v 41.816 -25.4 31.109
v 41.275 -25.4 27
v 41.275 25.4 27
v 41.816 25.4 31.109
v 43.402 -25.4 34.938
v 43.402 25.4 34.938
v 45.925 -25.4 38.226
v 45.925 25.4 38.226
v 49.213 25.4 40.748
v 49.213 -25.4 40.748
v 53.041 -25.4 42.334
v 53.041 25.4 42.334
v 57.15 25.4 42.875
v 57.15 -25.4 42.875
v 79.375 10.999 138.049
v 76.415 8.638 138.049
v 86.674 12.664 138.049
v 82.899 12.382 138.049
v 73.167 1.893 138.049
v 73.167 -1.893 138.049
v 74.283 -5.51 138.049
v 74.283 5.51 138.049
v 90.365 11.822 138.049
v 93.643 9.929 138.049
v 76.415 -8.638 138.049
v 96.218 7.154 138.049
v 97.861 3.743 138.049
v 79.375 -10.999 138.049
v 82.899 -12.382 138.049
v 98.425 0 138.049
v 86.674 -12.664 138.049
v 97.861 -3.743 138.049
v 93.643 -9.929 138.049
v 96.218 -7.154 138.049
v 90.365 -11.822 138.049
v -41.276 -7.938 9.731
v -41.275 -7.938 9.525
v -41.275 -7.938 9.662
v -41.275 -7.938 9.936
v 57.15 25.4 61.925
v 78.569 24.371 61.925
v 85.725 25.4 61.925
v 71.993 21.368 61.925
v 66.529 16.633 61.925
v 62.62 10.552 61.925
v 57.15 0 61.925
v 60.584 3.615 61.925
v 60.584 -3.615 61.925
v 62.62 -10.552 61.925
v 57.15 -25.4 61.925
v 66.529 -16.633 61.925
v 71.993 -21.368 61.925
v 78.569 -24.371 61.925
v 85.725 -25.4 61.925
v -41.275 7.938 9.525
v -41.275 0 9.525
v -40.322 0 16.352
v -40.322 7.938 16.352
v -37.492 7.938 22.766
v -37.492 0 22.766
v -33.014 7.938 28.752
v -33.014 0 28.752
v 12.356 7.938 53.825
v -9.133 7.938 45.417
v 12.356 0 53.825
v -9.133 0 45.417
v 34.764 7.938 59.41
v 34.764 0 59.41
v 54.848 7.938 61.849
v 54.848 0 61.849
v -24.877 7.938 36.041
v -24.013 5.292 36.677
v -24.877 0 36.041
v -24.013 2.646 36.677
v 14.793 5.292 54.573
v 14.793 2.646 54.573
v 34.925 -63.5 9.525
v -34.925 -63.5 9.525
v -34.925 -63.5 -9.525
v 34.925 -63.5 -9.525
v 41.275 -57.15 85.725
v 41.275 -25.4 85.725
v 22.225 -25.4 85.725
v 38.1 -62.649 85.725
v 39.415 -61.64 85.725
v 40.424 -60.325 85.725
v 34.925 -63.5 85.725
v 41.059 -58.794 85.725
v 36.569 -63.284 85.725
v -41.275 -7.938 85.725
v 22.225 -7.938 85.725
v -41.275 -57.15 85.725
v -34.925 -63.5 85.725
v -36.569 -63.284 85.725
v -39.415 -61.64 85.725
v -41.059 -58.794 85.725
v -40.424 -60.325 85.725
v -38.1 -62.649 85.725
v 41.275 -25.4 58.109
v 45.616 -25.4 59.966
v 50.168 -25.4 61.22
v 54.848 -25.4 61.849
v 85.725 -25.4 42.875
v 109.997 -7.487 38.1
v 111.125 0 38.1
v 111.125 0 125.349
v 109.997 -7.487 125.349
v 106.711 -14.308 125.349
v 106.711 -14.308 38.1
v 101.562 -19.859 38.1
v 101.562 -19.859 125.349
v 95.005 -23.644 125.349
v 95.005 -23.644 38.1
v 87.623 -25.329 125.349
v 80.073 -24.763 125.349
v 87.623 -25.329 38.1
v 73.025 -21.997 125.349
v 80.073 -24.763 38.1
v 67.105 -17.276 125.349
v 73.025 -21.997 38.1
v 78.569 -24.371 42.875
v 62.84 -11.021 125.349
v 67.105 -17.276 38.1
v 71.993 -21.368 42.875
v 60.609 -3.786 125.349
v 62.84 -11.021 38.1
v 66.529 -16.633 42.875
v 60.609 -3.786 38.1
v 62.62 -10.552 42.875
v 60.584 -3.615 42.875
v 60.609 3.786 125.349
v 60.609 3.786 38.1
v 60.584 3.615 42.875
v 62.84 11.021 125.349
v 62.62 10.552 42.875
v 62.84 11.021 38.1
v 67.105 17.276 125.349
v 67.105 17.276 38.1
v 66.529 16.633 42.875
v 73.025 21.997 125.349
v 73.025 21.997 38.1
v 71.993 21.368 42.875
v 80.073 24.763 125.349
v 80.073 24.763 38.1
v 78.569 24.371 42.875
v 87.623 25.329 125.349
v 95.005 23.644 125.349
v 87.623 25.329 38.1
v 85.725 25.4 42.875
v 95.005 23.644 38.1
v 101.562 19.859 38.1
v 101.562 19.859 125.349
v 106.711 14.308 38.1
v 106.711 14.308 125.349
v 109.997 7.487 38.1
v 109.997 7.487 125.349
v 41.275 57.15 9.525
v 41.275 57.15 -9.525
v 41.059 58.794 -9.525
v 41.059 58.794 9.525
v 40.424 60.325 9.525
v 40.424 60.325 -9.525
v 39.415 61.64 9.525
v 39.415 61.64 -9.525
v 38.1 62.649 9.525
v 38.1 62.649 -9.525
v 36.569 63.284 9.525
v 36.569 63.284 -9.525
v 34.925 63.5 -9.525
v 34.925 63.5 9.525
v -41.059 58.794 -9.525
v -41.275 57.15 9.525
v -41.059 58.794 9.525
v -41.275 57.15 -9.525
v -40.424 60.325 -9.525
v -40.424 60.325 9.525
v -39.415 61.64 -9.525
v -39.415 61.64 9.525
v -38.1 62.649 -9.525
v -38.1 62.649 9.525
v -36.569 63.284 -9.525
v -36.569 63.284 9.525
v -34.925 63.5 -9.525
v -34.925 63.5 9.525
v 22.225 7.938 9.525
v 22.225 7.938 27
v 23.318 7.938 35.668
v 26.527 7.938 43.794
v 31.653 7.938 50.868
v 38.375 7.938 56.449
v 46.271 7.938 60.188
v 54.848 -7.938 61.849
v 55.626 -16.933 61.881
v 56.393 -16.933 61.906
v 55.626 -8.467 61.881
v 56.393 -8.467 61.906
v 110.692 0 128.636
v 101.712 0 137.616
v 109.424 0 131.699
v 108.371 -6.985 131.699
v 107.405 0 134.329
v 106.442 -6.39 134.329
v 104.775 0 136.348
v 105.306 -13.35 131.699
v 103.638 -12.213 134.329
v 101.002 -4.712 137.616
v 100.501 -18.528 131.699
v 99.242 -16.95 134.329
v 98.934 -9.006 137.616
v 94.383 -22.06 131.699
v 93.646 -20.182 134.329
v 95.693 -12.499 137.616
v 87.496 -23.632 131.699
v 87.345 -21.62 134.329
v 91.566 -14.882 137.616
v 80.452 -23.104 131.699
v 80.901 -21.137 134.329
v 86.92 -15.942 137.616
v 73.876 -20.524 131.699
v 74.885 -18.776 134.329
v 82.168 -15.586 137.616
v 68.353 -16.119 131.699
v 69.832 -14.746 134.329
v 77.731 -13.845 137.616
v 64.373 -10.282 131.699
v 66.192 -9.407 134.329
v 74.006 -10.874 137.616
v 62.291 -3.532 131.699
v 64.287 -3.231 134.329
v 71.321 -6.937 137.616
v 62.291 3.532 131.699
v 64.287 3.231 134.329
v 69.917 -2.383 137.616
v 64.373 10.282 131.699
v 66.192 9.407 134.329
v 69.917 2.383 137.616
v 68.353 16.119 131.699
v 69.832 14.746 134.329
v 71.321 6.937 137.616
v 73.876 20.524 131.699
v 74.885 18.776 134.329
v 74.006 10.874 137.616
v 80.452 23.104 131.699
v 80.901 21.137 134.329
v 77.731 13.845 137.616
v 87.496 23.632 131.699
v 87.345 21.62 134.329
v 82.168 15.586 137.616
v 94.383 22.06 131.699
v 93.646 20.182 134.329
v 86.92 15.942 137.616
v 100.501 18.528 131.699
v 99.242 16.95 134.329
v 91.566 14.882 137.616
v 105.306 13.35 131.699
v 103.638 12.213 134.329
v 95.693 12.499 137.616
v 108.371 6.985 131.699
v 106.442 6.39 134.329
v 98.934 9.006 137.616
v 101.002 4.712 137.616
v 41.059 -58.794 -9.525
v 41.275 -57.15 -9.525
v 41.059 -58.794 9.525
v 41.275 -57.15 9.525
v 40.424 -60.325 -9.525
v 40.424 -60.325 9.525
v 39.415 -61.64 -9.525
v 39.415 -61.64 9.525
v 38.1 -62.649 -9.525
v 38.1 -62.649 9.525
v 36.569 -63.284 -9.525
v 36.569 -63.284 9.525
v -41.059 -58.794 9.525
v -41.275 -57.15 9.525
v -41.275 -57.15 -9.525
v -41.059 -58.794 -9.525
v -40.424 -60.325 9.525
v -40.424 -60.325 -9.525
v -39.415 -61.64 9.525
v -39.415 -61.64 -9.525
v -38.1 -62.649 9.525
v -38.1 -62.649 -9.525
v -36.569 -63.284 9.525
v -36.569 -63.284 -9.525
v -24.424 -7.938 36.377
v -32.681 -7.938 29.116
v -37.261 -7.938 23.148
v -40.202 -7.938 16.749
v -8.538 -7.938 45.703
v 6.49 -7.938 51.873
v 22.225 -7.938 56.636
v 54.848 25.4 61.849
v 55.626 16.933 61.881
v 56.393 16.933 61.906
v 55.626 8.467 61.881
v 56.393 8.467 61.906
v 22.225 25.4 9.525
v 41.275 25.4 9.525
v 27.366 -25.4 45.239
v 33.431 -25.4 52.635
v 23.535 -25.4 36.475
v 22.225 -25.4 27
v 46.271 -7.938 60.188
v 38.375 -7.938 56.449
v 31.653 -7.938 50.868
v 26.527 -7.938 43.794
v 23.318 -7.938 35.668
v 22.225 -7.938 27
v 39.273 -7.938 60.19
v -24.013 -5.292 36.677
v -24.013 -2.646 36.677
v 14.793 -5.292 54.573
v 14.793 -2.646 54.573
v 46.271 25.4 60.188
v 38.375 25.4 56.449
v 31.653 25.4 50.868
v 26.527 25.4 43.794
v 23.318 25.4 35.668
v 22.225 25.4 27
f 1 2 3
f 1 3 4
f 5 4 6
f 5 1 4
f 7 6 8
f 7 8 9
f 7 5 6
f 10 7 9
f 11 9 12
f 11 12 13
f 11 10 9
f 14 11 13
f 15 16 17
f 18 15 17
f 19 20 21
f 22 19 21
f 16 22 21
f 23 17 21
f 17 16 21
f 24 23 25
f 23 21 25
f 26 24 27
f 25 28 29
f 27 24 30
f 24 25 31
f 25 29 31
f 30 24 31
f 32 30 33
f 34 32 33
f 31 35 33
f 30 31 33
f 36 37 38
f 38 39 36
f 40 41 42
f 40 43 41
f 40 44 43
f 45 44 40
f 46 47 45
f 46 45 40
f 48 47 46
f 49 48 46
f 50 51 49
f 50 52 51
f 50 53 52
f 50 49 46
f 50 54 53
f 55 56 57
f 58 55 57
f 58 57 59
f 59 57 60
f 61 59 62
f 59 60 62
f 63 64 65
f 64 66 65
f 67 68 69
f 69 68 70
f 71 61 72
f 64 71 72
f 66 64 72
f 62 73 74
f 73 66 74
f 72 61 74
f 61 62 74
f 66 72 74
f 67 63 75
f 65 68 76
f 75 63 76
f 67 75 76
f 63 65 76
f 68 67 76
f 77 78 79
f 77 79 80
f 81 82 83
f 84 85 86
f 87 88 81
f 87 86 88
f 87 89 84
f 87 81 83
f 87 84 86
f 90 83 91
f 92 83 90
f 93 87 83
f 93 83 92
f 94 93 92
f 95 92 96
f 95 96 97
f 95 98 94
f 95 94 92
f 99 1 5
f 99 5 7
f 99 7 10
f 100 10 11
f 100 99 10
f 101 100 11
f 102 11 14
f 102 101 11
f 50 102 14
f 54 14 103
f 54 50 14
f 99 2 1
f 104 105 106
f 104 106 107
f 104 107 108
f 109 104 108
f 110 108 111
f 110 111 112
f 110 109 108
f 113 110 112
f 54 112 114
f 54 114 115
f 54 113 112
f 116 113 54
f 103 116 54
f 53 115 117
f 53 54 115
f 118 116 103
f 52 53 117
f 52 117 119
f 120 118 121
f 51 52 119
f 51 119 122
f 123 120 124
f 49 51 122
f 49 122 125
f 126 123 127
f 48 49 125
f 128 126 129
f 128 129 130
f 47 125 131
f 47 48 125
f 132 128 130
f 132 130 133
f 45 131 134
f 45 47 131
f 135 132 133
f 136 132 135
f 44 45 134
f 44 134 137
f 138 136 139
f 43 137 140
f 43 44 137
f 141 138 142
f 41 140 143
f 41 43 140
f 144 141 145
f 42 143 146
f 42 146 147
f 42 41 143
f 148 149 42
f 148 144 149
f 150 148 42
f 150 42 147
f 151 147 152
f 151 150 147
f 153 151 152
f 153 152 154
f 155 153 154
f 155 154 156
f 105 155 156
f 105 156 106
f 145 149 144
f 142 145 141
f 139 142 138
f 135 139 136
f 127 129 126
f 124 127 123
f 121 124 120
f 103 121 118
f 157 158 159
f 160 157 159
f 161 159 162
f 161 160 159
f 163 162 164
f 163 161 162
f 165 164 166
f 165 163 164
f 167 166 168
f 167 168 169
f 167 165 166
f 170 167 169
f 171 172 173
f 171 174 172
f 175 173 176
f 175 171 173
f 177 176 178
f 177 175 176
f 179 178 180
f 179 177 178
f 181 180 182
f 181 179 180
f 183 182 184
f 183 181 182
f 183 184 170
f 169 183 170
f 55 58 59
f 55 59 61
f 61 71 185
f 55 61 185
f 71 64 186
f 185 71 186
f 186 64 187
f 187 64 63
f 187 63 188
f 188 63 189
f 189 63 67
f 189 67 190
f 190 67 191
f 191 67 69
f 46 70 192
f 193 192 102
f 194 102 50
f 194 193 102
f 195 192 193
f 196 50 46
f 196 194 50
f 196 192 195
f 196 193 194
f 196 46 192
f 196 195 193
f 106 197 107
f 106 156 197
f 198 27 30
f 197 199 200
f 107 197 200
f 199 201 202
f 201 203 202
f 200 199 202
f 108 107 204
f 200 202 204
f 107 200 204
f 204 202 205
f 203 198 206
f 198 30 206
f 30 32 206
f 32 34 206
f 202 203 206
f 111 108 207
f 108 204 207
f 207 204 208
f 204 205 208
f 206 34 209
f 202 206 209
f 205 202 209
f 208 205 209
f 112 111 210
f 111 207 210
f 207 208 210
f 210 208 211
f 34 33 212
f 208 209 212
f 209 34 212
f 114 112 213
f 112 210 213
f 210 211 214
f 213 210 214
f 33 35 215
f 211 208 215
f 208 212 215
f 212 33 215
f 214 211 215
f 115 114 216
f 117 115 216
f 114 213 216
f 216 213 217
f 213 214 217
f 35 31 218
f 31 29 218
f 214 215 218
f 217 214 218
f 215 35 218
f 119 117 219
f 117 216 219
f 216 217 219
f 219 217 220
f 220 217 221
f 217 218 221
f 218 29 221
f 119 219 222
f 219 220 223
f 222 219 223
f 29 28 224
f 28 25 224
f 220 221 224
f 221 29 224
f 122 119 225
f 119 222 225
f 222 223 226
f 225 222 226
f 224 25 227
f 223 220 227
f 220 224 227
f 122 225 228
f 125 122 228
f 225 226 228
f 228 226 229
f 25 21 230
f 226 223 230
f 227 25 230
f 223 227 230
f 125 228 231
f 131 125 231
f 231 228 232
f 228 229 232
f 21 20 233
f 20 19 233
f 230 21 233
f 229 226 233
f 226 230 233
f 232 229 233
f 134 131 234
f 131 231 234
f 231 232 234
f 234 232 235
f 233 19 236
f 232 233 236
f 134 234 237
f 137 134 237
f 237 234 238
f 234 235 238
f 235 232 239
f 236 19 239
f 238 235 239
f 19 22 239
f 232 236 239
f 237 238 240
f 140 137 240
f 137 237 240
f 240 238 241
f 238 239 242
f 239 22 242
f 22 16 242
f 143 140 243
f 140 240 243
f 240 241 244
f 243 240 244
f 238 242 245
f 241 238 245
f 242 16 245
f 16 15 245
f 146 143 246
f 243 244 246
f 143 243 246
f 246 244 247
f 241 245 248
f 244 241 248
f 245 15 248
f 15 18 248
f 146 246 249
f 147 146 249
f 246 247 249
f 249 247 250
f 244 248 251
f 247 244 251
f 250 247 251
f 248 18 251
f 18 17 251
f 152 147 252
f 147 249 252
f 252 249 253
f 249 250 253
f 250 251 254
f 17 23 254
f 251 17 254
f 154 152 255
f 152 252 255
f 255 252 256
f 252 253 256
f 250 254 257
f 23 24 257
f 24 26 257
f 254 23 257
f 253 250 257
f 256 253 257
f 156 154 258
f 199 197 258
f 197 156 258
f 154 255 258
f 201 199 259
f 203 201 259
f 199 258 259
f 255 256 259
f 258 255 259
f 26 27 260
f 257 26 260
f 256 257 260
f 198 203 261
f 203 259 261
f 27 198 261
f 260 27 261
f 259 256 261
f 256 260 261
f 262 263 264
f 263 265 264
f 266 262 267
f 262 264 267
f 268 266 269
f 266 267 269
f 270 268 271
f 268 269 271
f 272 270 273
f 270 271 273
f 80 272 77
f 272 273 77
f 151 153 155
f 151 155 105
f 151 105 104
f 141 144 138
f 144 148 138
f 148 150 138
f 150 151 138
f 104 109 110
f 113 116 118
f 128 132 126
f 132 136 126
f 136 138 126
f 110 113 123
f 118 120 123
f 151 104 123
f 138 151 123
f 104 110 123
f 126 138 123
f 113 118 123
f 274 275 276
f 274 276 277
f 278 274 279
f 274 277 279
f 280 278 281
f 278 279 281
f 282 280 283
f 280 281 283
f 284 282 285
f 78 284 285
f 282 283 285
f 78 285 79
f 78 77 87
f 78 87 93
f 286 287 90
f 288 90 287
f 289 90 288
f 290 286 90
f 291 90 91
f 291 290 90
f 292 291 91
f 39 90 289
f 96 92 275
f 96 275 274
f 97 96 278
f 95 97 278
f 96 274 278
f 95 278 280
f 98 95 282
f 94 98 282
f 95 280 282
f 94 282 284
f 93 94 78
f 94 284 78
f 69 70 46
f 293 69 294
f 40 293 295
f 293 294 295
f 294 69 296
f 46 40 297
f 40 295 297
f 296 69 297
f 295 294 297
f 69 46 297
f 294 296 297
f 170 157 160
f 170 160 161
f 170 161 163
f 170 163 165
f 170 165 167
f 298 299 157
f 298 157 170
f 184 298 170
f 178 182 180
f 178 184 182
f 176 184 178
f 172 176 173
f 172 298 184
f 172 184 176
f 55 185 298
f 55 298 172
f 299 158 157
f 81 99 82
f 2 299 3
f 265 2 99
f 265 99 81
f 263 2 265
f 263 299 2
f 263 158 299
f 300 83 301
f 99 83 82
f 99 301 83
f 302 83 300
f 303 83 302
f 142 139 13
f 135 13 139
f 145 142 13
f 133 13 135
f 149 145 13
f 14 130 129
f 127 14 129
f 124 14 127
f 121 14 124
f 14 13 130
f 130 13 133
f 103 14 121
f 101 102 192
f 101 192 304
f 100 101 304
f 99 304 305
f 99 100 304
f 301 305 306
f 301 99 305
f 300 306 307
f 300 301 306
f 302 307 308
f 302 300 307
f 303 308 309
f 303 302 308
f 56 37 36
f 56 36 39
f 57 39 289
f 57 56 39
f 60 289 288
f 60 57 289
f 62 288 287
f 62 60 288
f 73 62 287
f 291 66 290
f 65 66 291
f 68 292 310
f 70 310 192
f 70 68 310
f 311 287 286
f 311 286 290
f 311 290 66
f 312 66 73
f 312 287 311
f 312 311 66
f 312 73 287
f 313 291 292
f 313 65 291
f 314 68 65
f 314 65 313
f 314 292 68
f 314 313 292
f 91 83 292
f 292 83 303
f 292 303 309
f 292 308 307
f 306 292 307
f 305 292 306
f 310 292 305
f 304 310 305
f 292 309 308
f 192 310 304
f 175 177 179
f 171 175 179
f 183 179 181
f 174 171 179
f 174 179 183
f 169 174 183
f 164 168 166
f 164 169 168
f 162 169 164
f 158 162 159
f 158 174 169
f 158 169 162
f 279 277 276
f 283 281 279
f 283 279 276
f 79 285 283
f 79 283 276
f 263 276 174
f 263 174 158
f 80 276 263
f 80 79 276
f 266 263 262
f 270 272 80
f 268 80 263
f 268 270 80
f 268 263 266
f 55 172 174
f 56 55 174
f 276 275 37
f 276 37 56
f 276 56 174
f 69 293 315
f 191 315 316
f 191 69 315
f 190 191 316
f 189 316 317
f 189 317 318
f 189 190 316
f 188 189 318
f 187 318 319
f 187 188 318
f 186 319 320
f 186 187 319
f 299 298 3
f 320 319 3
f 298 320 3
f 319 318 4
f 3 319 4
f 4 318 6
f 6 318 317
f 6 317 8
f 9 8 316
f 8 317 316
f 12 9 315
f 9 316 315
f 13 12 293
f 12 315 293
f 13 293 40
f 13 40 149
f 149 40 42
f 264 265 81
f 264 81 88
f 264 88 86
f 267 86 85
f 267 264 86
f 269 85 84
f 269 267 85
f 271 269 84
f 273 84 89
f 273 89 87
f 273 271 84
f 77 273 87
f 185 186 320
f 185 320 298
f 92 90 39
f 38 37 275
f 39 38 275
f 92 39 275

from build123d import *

# Parameters (mm, degrees)
F1_DEPTH = 63.5
F0_W     = 25.4
F0_H     = 19.05
F2_DEPTH = 25.4
F3_DEPTH = 7.9375
F5_R     = 6.35
F6_DEPTH = 71.374
F7_DEPTH = 76.2
F8_R     = 12.7


with BuildPart() as f1:
    # F0 (on Front) → F1 (new body, symmetric)
    with BuildSketch(Plane.XZ):
        Polygon((41.275, -9.525), (41.275, 9.525), (22.225, 9.525), (-41.275, 9.525), (-41.275, -9.525), align=None)
    extrude(amount=F1_DEPTH, both=True)

    # F0 (on Front) → F2 (join, symmetric)
    with BuildSketch(Plane.XZ):
        with BuildLine():
            Line((22.225, 9.525), (41.275, 9.525))
            Line((41.275, 9.525), (41.275, 27.0002))
            ThreePointArc((41.275, 27.0002), (45.9246798487, 38.2255201513), (57.15, 42.8752))
            Line((57.15, 42.8752), (60.325, 42.8752))
            Line((60.325, 42.8752), (60.325, 61.9252))
            Line((60.325, 61.9252), (57.15, 61.9252))
            add(Edge.make_bspline(
                [(54.8482161911, 61.8492662184), (55.6310728691, 61.884179015), (56.3987085315, 61.9095154181), (57.15, 61.9252)],
                knots=[108.9887730241, 108.9887730241, 108.9887730241, 108.9887730241, 111.5045361635, 111.5045361635, 111.5045361635, 111.5045361635], degree=3))
            ThreePointArc((54.8482161911, 61.8492662184), (31.6534764671, 50.8682311869), (22.225, 27.0002))
            Line((22.225, 27.0002), (22.225, 9.525))
        make_face()
        with Locations((73.025, 52.4002)):
            Rectangle(F0_W, F0_H)
    extrude(amount=F2_DEPTH, both=True)

    # F0 (on Front) → F3 (join, symmetric)
    with BuildSketch(Plane.XZ):
        with BuildLine():
            Line((-41.275, 9.525), (22.225, 9.525))
            Line((22.225, 9.525), (22.225, 27.0002))
            ThreePointArc((22.225, 27.0002), (31.6534764671, 50.8682311869), (54.8482161911, 61.8492662184))
            add(Edge.make_bspline(
                [(-41.275, 9.525), (-41.5493658366, 40.8510325395), (20.933024634, 60.3367618025), (54.8482161911, 61.8492662184)],
                knots=[0, 0, 0, 0, 108.9887730241, 108.9887730241, 108.9887730241, 108.9887730241], degree=3))
        make_face()
    extrude(amount=F3_DEPTH, both=True)

    # F0 (on Front) → F4 (revolve)
    with BuildSketch(Plane.XZ):
        Polygon((85.725, 61.9252), (85.725, 42.8752), (85.725, 38.1), (111.125, 38.1), (111.125, 66.675), (85.725, 66.675), align=None)
    revolve(axis=Axis((85.725, 0, 52.3875), (0, 0, -1)))

    # F5
    f5_edges = [f1.edges().sort_by_distance(p)[0] for p in [
        (41.275, -63.5, 0),
        (-41.275, -63.5, 0),
        (41.275, 63.5, 0),
        (-41.275, 63.5, 0),
    ]]
    fillet(f5_edges, radius=F5_R)

    # F6 (add): a face of the model
    f6_faces = [f1.faces().sort_by_distance(p)[0] for p in [
        (85.725, 0, 66.675),
    ]]
    extrude(f6_faces, amount=F6_DEPTH)

    # F7 (add): a face of the model
    f7_faces = [f1.faces().sort_by_distance(p)[0] for p in [
        (-2.4929619757, -37.1068375297, 9.525),
    ]]
    extrude(f7_faces, amount=F7_DEPTH)

    # F8
    f8_edges = [f1.edges().sort_by_distance(p)[0] for p in [
        (60.325, 0, 138.049),
    ]]
    fillet(f8_edges, radius=F8_R)


solid = f1.part
